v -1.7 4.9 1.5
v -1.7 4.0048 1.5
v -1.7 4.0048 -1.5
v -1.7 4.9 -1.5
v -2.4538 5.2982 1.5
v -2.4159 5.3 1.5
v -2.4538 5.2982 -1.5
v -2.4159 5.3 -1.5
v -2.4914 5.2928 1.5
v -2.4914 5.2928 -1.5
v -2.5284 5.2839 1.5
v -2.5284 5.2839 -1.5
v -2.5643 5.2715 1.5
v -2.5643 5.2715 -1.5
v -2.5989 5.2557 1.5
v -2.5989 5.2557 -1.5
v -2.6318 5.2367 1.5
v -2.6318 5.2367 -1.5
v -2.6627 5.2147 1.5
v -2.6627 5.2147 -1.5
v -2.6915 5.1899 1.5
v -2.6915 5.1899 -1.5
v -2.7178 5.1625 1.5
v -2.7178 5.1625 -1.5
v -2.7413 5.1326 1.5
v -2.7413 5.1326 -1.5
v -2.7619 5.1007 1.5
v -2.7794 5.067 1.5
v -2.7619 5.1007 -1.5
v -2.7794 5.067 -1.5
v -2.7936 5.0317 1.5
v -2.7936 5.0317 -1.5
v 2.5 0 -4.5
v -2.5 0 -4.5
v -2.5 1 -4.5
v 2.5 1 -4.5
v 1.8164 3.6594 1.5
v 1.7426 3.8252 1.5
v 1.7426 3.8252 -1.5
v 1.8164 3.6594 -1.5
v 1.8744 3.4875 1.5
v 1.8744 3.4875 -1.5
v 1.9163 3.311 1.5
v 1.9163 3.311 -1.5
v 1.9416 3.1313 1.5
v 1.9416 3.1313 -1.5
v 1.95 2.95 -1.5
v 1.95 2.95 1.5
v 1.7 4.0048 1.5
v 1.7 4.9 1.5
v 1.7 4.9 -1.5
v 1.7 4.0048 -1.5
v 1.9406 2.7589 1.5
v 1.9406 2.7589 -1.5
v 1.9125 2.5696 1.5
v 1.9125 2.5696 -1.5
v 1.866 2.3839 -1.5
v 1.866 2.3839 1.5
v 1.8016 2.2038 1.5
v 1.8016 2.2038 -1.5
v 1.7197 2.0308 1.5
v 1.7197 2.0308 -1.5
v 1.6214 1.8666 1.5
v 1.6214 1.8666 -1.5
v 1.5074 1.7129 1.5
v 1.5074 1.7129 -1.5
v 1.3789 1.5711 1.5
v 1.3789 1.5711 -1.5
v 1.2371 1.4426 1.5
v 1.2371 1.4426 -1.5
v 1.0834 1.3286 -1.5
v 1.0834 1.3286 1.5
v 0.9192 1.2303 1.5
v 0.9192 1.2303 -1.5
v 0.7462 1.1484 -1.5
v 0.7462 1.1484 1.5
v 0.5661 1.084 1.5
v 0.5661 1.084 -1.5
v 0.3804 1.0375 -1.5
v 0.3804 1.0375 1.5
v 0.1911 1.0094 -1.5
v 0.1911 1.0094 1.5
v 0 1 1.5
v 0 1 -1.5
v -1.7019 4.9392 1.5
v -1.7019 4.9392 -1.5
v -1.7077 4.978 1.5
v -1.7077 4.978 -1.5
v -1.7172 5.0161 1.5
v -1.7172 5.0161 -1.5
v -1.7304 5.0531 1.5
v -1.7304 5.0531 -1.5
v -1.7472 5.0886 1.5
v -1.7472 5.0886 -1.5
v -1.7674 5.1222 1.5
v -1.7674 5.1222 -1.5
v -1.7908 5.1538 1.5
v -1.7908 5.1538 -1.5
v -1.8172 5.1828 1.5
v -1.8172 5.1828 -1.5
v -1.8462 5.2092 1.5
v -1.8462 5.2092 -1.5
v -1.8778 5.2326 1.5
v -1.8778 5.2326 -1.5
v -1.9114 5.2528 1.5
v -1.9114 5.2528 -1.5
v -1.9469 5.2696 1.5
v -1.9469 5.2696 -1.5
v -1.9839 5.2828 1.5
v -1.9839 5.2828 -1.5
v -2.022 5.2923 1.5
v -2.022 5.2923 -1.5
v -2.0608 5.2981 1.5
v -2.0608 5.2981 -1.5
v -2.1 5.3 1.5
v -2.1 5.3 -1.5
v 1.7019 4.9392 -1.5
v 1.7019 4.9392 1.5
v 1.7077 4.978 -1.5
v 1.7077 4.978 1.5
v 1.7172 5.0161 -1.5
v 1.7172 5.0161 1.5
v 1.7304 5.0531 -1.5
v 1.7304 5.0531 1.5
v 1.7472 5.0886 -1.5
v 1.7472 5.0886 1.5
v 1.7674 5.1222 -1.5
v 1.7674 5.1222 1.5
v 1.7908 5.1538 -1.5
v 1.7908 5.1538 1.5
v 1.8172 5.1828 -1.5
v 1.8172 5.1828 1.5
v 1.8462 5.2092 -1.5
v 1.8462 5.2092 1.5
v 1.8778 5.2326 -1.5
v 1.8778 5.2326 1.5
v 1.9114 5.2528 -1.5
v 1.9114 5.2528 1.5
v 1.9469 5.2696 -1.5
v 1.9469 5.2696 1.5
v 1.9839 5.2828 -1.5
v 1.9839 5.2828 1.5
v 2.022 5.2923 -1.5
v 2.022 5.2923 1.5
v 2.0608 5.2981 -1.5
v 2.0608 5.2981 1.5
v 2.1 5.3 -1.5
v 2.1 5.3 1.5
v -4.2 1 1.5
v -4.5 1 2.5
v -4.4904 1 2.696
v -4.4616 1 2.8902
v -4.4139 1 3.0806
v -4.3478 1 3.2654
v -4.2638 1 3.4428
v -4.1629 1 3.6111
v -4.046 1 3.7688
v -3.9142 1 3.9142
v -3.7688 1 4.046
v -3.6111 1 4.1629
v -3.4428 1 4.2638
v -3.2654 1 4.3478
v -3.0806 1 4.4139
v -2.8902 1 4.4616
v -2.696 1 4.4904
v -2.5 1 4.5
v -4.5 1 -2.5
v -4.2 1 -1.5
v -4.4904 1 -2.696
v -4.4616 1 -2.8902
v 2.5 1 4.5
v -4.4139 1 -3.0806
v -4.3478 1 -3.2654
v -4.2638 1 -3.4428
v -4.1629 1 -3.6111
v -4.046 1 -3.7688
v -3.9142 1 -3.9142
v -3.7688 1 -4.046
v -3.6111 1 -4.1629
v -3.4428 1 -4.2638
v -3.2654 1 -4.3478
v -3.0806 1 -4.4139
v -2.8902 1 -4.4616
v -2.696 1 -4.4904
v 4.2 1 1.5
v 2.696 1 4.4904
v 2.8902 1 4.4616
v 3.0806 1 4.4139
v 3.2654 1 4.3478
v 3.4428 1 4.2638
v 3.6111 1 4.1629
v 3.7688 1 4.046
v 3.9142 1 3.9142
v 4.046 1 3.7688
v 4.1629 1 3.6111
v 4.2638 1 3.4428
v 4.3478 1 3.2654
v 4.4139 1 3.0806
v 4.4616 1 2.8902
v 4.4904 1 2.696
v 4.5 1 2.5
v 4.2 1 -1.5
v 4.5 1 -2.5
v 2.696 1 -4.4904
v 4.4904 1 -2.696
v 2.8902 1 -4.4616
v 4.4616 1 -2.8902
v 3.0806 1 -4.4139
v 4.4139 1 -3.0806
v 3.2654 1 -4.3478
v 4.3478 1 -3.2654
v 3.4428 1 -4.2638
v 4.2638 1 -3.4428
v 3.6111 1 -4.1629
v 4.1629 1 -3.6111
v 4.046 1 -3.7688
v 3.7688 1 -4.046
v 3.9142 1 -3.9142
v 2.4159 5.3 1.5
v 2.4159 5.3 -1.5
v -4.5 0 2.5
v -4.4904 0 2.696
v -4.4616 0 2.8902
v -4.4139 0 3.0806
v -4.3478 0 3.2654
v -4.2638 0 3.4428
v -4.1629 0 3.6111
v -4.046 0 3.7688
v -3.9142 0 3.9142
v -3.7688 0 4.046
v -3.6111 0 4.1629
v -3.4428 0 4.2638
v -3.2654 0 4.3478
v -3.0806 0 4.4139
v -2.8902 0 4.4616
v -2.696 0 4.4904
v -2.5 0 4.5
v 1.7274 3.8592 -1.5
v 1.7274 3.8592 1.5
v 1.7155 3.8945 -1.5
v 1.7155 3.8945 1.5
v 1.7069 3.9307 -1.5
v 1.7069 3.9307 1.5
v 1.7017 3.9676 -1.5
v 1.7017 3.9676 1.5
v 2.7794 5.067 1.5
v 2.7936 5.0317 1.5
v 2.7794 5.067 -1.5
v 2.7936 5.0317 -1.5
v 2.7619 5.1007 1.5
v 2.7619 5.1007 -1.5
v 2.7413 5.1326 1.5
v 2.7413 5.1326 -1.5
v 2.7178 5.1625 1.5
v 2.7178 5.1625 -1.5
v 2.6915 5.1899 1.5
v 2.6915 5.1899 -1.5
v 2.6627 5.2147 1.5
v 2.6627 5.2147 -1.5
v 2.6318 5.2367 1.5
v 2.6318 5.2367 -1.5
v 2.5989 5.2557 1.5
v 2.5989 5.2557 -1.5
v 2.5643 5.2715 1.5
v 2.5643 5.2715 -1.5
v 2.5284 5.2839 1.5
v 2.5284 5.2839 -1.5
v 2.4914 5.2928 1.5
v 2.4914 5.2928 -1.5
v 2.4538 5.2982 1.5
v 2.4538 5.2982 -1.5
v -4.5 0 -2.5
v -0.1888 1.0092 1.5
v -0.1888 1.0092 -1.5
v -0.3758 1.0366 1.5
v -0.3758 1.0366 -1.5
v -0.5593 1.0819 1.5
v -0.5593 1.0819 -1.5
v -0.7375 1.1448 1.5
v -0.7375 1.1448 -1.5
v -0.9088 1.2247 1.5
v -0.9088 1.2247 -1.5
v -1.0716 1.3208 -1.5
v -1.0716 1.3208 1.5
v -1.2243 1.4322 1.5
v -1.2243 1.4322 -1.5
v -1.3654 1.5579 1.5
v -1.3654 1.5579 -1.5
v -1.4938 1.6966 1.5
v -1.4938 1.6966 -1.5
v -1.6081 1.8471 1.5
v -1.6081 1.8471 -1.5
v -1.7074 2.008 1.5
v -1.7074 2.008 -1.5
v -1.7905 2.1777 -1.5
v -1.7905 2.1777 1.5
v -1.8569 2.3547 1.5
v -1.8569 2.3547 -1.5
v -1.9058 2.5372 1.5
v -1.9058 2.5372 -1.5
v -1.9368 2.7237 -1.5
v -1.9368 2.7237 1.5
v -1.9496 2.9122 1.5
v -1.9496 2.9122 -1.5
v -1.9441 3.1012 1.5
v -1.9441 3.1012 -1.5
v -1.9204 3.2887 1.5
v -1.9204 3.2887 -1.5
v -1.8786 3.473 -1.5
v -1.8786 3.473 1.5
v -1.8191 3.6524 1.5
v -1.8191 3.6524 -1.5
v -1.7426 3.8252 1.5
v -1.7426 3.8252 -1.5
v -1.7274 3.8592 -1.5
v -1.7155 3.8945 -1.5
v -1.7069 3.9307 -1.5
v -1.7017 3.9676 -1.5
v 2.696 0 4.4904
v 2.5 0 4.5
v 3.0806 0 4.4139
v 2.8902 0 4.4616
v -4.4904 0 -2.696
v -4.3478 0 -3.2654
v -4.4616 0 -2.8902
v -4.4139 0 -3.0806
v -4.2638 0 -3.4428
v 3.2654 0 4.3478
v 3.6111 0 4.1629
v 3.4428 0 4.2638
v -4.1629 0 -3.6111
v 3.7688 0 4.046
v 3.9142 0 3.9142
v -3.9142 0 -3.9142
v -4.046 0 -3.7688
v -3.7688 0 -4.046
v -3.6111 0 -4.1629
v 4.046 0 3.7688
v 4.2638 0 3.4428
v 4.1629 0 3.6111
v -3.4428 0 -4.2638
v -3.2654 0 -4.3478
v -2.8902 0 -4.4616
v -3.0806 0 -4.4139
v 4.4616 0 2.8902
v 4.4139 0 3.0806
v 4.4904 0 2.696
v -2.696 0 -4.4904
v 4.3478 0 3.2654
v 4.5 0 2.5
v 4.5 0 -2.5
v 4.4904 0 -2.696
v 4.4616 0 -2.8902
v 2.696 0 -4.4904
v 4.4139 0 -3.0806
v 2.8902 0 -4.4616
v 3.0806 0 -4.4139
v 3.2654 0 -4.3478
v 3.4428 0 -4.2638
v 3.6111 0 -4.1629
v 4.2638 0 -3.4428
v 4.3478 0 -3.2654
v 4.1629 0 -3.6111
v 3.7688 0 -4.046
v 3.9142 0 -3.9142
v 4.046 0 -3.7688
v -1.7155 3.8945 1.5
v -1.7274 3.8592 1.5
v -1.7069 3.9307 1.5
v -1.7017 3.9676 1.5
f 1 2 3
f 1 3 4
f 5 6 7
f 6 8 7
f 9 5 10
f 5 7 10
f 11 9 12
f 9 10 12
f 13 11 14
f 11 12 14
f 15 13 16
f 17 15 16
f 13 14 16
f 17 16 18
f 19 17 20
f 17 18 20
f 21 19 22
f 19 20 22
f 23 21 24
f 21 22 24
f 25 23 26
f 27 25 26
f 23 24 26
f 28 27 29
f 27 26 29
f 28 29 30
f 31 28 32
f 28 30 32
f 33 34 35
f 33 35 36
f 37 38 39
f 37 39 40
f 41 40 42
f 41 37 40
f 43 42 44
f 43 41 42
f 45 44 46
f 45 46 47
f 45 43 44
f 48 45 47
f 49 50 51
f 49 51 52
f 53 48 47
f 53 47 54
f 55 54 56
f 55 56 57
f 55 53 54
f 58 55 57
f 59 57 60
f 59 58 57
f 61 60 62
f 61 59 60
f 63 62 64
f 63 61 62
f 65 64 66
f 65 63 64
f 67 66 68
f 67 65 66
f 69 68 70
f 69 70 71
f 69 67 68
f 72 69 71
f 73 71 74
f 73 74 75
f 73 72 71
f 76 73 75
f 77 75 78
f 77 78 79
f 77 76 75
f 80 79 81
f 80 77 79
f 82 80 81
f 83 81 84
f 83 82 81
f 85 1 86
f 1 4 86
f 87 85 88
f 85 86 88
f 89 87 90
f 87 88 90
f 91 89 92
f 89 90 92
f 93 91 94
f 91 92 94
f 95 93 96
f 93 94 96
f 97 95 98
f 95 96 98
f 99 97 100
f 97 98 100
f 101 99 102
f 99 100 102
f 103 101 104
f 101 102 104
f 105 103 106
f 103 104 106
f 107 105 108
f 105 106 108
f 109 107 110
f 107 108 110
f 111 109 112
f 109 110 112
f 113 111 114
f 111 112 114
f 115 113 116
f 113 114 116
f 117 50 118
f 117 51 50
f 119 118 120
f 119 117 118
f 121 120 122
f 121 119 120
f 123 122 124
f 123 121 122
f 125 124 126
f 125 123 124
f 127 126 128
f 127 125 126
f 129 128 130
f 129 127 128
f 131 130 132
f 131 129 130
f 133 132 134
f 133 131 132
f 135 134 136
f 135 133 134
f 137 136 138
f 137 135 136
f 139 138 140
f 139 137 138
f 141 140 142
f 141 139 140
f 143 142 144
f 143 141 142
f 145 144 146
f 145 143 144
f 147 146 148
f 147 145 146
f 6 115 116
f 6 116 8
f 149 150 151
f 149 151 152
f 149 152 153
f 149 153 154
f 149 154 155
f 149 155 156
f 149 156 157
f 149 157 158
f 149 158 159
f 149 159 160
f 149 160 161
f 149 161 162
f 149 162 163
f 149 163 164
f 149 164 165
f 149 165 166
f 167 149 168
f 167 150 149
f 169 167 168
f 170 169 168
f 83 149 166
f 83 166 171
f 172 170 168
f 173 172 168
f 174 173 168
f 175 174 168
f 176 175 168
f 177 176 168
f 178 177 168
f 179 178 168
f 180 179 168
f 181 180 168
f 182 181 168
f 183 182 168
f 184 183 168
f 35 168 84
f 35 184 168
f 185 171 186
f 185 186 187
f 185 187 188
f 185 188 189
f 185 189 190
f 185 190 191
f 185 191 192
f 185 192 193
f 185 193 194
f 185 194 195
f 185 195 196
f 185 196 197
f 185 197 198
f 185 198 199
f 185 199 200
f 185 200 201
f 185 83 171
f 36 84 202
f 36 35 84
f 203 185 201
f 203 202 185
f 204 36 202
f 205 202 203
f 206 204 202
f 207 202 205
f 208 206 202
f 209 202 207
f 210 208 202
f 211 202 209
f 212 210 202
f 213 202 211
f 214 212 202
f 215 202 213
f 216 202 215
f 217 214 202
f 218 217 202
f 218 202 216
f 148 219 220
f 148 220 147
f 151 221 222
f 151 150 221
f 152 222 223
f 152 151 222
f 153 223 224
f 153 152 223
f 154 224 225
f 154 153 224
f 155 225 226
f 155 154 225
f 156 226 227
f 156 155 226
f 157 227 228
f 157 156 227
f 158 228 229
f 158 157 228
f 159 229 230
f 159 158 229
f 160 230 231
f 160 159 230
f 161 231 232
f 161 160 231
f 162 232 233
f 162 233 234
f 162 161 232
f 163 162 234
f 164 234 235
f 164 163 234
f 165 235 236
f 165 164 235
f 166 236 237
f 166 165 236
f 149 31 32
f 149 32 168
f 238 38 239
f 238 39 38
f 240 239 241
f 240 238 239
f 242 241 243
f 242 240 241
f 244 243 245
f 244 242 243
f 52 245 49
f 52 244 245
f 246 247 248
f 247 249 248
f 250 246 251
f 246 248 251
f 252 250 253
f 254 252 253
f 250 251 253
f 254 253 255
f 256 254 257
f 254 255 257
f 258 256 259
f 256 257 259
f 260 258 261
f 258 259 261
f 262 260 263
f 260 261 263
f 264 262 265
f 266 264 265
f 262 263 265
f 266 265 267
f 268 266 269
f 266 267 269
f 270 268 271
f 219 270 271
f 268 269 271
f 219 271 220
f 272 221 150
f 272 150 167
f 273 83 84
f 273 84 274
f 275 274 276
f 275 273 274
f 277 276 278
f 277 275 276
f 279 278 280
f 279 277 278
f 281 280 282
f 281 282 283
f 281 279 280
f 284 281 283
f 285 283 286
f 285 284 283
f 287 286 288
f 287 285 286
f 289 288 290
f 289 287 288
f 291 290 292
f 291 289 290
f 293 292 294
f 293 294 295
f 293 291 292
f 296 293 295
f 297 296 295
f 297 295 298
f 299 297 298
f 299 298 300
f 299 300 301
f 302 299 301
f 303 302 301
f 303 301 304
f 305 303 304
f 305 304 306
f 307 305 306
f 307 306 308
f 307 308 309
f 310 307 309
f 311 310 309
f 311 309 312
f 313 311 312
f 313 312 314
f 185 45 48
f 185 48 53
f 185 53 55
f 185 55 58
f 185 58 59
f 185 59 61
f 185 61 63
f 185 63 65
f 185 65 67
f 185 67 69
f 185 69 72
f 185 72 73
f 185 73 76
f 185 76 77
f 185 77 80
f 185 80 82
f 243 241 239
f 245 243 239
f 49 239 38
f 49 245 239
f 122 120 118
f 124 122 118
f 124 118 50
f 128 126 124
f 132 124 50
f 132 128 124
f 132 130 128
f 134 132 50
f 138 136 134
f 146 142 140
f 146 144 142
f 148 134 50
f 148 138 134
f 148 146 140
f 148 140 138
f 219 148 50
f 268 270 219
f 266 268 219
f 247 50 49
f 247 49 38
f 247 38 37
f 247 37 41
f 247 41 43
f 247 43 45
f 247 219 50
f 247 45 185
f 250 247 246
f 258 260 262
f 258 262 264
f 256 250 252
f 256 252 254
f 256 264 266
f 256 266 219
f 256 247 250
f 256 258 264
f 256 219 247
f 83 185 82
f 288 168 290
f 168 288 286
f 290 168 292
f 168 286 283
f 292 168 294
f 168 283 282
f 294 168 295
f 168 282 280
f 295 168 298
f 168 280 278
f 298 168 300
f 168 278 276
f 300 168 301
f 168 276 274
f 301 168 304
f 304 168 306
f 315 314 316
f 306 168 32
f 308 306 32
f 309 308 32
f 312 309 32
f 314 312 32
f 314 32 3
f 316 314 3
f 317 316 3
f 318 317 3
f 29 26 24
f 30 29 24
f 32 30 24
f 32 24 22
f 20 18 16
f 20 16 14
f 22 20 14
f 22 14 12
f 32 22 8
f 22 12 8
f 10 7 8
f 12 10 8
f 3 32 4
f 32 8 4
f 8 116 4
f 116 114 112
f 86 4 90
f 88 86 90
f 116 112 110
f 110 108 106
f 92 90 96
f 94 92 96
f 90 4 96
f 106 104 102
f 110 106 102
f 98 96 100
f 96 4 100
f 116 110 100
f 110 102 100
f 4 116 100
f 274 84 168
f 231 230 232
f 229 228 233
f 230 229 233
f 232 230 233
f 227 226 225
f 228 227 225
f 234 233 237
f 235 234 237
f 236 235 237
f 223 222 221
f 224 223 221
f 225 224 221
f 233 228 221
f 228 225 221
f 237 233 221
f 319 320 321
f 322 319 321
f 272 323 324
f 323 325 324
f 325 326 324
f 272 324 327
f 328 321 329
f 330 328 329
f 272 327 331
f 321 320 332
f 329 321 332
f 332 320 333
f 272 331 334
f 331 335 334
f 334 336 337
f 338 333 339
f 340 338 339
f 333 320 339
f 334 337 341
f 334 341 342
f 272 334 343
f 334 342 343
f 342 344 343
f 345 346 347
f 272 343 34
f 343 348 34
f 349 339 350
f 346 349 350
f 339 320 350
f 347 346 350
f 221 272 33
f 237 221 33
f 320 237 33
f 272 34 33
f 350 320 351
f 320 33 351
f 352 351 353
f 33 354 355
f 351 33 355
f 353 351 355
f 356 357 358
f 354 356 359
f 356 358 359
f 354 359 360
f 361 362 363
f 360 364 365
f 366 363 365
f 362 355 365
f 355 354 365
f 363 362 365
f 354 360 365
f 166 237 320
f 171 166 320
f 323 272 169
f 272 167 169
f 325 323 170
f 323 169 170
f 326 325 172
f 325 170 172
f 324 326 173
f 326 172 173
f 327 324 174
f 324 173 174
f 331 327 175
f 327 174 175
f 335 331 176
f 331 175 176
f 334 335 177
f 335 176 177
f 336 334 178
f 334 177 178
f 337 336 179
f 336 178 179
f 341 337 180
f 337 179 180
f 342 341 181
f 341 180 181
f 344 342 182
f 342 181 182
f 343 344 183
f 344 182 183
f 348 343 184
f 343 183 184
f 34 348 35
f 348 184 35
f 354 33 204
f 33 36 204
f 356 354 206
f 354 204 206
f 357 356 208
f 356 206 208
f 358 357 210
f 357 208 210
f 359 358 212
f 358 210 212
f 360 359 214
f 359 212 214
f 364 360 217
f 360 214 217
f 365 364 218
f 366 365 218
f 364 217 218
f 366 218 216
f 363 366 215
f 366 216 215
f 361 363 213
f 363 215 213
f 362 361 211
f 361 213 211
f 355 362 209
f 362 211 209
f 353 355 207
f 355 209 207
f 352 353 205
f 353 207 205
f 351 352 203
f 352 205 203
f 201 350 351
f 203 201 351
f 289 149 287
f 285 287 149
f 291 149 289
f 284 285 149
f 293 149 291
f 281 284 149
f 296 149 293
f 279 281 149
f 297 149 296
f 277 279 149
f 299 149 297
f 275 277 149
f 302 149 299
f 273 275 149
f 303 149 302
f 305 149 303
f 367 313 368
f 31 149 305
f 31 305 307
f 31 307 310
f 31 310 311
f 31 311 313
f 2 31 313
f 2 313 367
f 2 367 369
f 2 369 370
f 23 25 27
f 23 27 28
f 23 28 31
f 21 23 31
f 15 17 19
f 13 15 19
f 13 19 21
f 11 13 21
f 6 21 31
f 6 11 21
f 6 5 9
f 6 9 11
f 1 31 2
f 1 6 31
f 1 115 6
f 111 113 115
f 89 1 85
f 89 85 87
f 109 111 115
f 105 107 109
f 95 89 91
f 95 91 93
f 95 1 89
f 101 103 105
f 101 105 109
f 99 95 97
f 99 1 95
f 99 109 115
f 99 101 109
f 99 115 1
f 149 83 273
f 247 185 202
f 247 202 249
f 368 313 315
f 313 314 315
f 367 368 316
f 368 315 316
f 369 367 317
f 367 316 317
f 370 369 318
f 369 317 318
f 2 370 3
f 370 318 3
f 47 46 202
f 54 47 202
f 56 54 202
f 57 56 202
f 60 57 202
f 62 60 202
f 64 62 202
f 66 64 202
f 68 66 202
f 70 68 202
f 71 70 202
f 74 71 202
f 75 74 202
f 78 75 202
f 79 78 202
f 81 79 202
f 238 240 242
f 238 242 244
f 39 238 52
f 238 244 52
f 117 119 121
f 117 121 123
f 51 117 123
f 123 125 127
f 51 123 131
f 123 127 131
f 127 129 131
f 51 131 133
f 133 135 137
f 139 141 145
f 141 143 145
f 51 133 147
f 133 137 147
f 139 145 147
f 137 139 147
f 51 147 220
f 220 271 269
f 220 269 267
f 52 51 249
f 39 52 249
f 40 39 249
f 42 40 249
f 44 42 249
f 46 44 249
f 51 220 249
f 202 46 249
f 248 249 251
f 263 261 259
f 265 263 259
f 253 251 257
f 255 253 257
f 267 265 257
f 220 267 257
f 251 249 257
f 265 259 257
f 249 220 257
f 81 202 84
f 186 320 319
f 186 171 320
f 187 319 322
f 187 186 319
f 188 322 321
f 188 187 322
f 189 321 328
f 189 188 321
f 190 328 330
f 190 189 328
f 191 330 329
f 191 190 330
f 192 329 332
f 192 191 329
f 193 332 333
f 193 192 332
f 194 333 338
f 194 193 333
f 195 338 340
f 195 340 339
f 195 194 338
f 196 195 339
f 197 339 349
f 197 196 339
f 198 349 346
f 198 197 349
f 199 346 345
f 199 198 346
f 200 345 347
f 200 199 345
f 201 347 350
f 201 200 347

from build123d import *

# Parameters (mm, degrees)
SKETCH1_W           = 9
SKETCH1_H           = 9
BOSS_EXTRUDE1_DEPTH = 1
BOSS_EXTRUDE2_DEPTH = 3
FILLET1_R           = 0.4
FILLET2_R           = 2


with BuildPart() as part:
    # Sketch1 → Boss-Extrude1 (new body)
    with BuildSketch(Plane(origin=(0, 0, 0), x_dir=(1, 0, 0), z_dir=(0, 1, 0))):
        Rectangle(SKETCH1_W, SKETCH1_H)
    extrude(amount=BOSS_EXTRUDE1_DEPTH)

    # Sketch2 → Boss-Extrude2 (add)
    with BuildSketch(Plane.XY.offset(1.5)):
        with BuildLine():
            ThreePointArc((0, 1), (-1.683038158, 1.965173844), (-1.7, 3.905248659))
            Line((-1.7, 3.905248659), (-1.7, 5.3))
            Line((-1.7, 5.3), (-2.7, 5.3))
            Line((-2.7, 5.3), (-4.2, 1))
            Line((-4.2, 1), (0, 1))
        make_face()
        with BuildLine():
            Line((1.7, 5.3), (1.7, 3.905248659))
            ThreePointArc((1.7, 3.905248659), (1.886464948, 3.443710441), (1.95, 2.95))
            ThreePointArc((1.95, 2.95), (1.378858223, 1.571141777), (0, 1))
            Line((0, 1), (4.2, 1))
            Line((4.2, 1), (2.7, 5.3))
            Line((2.7, 5.3), (1.7, 5.3))
        make_face()
    extrude(amount=-BOSS_EXTRUDE2_DEPTH)

    # Fillet1
    fillet1_edges = [part.edges().sort_by_distance(p)[0] for p in [
        (-1.7, 3.905248659, 0),
        (-2.7, 5.3, 0),
        (-1.7, 5.3, 0),
        (1.7, 3.905248659, 0),
        (1.7, 5.3, 0),
        (2.7, 5.3, 0),
    ]]
    fillet(fillet1_edges, radius=FILLET1_R)

    # Fillet2
    fillet2_edges = [part.edges().sort_by_distance(p)[0] for p in [
        (4.5, 0.5, 4.5),
        (-4.5, 0.5, 4.5),
        (-4.5, 0.5, -4.5),
        (4.5, 0.5, -4.5),
    ]]
    fillet(fillet2_edges, radius=FILLET2_R)


solid = part.part
